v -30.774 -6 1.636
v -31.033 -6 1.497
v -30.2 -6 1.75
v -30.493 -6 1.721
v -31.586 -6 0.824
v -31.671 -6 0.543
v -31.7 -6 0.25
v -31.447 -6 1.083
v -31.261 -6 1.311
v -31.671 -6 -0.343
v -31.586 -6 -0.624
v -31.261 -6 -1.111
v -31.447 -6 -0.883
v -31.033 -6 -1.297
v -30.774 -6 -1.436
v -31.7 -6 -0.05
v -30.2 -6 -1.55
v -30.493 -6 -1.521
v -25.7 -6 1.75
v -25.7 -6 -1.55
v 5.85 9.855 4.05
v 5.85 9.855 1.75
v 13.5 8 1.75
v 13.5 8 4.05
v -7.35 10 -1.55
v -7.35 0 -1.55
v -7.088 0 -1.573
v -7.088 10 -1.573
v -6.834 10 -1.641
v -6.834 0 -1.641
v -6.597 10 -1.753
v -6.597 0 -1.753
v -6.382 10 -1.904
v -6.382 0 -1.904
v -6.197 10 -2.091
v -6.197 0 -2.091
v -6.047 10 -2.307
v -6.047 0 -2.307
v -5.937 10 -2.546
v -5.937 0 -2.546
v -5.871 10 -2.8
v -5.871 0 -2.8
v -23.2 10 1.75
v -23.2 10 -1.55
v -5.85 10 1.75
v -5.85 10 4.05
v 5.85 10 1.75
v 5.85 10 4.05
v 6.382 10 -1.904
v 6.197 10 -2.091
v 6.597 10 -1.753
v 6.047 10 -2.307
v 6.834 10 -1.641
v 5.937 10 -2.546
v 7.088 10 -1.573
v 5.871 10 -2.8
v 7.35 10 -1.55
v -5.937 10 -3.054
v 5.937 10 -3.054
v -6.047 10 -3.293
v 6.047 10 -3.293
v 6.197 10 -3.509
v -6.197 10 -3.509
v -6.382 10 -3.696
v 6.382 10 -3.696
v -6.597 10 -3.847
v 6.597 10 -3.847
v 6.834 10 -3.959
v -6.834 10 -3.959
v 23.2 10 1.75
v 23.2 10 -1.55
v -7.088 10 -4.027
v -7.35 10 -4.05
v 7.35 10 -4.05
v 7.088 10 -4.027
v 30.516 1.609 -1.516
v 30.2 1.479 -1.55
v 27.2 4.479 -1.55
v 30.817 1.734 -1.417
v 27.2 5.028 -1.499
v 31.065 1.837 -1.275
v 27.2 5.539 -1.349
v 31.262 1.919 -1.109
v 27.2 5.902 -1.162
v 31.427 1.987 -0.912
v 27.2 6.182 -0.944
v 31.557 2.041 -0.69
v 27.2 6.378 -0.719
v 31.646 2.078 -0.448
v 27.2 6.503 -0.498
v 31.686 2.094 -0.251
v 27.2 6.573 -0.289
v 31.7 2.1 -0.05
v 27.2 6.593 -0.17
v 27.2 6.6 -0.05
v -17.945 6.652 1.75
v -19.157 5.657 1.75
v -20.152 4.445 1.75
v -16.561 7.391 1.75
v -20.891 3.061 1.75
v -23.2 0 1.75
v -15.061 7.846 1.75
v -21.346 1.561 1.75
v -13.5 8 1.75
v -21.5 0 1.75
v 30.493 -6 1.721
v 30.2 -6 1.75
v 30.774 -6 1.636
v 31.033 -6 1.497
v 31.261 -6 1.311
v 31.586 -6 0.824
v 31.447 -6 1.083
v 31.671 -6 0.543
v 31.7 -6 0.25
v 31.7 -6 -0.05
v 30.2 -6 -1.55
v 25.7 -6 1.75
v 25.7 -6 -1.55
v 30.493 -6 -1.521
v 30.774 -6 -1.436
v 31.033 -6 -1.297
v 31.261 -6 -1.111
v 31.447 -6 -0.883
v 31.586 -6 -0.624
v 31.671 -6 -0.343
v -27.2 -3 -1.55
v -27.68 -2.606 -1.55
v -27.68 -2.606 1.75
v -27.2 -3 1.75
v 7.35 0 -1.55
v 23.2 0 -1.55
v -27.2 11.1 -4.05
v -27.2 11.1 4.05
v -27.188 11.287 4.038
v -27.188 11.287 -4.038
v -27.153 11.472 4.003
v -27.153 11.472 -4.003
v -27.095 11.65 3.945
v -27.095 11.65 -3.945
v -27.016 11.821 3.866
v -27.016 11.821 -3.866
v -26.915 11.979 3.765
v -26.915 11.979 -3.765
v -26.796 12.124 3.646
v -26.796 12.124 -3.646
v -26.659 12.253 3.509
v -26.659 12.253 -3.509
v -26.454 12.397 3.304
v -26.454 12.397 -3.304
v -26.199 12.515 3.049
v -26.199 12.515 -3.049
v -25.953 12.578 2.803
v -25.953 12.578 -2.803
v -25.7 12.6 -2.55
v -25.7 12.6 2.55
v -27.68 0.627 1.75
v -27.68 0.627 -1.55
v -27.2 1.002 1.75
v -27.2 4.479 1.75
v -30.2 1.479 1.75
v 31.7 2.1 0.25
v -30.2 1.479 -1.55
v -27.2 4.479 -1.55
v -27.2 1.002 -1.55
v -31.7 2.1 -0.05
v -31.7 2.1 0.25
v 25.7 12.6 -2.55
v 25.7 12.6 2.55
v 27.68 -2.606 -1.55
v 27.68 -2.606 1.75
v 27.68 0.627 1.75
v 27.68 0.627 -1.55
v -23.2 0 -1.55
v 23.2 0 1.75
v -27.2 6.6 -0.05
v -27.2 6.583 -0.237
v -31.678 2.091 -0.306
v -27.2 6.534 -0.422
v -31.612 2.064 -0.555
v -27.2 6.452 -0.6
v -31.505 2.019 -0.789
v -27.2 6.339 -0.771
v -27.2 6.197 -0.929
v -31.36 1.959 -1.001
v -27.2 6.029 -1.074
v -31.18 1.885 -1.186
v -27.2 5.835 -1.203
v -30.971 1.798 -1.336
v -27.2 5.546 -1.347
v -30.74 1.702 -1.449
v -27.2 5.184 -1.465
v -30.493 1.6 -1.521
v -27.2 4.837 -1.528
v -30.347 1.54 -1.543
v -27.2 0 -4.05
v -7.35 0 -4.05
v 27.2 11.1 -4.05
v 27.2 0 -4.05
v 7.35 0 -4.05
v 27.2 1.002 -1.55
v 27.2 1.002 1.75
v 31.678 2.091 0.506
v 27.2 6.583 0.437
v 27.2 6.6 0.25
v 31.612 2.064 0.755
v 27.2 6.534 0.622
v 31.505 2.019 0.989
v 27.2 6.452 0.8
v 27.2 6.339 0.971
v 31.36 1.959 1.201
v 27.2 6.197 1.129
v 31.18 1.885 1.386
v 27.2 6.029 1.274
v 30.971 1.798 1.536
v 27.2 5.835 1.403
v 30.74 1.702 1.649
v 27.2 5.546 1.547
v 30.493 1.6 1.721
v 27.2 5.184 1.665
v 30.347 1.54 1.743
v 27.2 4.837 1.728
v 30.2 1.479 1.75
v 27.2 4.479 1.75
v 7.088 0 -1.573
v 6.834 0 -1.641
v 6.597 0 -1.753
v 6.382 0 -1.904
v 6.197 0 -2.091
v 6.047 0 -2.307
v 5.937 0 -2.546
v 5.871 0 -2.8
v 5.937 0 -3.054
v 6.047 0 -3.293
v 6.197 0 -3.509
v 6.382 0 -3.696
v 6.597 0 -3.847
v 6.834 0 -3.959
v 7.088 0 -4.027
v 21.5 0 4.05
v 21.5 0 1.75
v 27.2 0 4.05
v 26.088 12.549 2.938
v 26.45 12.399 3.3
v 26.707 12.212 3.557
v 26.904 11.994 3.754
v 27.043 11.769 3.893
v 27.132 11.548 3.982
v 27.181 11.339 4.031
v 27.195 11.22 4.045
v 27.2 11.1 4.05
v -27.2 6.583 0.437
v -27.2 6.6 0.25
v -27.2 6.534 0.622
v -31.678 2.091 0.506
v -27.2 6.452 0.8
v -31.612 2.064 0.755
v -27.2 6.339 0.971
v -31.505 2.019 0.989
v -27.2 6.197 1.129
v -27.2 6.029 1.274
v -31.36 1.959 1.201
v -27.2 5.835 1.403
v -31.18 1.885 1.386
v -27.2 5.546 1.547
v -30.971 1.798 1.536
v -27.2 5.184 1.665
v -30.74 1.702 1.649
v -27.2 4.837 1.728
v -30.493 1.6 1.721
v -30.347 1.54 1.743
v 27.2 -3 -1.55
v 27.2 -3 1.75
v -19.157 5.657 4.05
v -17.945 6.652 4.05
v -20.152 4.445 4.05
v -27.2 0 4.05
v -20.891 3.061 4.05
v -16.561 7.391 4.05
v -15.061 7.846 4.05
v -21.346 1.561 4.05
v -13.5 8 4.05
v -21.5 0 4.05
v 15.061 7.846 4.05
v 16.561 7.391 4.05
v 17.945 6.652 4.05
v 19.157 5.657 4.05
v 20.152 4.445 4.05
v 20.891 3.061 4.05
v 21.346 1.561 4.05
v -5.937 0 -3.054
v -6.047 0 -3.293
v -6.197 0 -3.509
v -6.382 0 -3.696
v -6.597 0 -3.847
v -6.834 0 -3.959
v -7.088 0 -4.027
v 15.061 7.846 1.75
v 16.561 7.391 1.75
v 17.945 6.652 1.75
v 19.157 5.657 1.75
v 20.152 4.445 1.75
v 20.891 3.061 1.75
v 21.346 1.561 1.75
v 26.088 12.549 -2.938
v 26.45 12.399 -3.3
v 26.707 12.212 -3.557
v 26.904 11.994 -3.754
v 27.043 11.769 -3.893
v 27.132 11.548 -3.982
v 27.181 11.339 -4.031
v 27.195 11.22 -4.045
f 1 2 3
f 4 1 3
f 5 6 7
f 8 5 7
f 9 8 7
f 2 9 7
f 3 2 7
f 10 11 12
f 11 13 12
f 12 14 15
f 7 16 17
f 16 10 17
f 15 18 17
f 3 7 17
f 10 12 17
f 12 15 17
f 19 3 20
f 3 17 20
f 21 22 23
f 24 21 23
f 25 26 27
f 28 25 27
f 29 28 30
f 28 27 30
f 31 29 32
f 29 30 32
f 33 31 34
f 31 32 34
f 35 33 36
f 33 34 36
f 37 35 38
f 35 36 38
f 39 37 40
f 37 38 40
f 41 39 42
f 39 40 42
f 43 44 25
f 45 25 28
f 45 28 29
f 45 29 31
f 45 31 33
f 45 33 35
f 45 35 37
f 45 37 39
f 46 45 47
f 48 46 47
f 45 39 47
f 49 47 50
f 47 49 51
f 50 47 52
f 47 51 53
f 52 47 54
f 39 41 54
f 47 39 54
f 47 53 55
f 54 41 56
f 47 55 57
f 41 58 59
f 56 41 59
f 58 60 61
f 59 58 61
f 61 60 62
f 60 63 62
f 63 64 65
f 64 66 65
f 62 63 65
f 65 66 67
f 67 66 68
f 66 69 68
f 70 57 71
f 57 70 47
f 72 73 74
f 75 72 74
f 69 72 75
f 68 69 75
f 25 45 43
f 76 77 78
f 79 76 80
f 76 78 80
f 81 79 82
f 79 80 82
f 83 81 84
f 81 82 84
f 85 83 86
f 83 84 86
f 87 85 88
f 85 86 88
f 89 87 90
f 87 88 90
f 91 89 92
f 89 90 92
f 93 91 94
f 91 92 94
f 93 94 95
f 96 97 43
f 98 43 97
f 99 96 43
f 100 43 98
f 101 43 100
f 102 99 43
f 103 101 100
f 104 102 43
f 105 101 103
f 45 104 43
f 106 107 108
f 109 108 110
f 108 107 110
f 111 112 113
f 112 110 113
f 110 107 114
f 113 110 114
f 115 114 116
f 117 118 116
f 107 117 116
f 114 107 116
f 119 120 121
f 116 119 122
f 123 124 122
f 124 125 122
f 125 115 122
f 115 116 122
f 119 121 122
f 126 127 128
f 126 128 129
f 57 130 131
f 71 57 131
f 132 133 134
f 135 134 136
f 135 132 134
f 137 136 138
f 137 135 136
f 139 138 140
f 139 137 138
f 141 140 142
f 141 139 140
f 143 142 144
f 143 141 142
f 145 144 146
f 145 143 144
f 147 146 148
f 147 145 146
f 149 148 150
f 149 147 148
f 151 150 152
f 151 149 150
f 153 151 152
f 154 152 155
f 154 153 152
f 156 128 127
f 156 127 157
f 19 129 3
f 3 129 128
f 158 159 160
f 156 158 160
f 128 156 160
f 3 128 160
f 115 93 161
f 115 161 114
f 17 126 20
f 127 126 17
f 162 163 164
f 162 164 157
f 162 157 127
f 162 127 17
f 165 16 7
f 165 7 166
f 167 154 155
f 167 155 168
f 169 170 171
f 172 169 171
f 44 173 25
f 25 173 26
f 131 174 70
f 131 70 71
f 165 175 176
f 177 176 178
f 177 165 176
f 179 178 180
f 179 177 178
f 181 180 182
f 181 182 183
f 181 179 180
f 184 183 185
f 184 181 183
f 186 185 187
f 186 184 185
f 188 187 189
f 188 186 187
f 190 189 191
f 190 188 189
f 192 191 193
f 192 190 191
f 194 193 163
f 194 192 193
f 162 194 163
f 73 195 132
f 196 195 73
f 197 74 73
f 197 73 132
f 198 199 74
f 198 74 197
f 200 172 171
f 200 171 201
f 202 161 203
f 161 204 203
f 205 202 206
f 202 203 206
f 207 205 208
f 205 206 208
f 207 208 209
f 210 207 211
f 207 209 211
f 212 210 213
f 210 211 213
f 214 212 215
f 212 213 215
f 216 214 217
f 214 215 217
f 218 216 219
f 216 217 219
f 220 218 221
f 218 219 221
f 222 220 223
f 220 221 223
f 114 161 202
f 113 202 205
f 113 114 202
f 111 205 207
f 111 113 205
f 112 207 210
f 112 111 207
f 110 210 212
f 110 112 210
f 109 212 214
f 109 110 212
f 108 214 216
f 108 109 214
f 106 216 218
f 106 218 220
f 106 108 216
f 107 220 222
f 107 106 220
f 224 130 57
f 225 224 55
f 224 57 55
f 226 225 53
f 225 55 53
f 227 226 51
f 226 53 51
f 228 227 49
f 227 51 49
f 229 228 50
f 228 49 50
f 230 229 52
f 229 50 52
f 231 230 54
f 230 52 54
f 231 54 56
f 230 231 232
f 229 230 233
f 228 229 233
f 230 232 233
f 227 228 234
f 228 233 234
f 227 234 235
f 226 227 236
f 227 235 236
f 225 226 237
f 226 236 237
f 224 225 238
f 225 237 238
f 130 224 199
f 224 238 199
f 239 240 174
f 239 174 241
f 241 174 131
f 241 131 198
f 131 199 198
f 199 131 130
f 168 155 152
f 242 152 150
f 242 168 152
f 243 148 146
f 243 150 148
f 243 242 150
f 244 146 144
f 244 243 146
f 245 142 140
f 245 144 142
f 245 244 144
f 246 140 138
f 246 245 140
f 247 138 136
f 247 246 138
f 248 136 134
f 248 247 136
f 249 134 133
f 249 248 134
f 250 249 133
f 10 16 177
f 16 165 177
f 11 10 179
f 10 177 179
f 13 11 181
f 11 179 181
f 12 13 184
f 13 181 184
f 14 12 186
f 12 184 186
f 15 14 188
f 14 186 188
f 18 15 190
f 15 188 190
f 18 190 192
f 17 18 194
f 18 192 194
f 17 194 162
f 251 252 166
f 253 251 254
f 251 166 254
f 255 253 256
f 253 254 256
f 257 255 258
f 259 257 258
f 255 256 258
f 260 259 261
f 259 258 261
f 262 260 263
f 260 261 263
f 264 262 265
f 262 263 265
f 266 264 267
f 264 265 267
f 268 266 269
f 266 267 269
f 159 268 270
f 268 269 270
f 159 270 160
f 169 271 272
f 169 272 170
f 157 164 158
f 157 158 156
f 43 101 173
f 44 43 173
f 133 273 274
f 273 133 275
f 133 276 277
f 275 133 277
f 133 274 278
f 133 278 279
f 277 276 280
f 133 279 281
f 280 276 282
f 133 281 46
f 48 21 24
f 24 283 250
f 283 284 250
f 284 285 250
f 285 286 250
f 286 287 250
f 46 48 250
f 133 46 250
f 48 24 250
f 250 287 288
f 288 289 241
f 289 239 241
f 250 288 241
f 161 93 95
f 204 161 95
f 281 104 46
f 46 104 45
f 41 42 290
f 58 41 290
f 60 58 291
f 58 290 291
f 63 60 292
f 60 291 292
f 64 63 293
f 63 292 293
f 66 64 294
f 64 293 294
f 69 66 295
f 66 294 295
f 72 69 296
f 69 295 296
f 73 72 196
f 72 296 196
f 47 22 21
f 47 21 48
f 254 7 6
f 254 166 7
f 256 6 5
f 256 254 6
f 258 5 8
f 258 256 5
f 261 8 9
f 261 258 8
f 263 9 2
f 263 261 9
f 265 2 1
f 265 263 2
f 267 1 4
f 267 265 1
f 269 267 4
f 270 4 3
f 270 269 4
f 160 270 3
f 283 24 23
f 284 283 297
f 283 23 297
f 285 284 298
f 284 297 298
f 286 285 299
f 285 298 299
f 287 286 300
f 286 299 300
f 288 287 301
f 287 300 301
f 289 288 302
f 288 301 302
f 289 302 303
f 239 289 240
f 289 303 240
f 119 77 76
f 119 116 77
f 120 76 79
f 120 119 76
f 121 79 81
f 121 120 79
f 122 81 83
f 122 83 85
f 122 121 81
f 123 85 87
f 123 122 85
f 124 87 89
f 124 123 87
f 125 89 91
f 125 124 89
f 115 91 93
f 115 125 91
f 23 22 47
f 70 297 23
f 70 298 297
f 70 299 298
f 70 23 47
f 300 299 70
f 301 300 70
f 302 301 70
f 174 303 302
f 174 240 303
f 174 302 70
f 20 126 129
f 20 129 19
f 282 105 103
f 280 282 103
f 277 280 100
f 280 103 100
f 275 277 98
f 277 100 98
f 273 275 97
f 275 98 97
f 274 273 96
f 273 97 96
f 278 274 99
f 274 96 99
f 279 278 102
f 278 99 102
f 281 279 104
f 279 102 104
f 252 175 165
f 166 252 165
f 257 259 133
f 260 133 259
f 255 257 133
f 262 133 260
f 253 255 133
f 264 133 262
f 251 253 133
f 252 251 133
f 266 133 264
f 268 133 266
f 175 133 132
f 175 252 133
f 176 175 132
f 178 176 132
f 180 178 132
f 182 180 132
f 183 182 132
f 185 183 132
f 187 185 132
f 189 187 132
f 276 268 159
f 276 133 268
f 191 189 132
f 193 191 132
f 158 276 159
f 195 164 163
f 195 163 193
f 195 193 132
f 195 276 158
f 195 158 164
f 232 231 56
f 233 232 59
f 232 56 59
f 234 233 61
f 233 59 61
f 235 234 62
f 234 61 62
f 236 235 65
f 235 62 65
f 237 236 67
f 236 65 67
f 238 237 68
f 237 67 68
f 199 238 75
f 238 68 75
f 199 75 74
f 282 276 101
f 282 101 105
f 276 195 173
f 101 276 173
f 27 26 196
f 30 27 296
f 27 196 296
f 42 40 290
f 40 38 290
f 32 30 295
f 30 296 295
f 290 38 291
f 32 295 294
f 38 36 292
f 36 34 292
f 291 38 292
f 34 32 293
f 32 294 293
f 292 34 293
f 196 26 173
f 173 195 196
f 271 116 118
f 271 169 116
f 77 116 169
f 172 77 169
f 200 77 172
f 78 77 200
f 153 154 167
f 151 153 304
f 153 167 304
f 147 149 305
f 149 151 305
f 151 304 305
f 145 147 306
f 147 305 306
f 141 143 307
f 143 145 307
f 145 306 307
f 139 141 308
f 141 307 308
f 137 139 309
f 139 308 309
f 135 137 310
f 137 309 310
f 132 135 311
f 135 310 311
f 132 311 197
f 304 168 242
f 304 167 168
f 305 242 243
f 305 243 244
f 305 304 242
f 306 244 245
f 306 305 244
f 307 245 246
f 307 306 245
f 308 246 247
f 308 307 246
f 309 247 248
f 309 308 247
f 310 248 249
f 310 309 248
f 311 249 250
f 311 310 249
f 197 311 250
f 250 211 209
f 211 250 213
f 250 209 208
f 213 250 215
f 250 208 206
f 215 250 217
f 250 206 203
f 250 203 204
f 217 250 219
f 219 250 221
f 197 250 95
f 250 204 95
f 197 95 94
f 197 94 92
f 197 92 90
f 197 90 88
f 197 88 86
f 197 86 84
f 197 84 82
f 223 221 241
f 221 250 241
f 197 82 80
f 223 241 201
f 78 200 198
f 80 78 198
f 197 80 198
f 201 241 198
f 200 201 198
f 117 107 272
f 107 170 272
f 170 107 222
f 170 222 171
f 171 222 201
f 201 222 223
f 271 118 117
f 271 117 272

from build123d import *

# Parameters (mm, degrees)
SKETCH1_W           = 54.4
SKETCH1_H           = 8.1
SKETCH1_W_2         = 46.4
SKETCH1_H_2         = 3.3
BOSS_EXTRUDE1_DEPTH = 10
SKETCH2_W           = 11.7
SKETCH2_H           = 20
CUT_EXTRUDE1_DEPTH  = 10
SKETCH3_R           = 8
CUT_EXTRUDE2_DEPTH  = 10
SKETCH4_W           = 54.4
SKETCH4_H           = 8.1
BOSS_EXTRUDE2_DEPTH = 2.6
BOSS_EXTRUDE3_DEPTH = 3.3
SKETCH2_2_W         = 11.7
SKETCH2_2_H         = 20
CUT_EXTRUDE3_DEPTH  = 20
CUT_EXTRUDE4_START  = -5
CUT_EXTRUDE4_DEPTH  = 5
SKETCH7_W           = 2.777966001
SKETCH7_H           = 4.960653573
BOSS_EXTRUDE4_DEPTH = 3.3
FILLET1_R           = 1.5
FILLET2_R           = 1.5
FILLET3_R           = 1.5
FILLET4_R           = 1.5


with BuildPart() as part:
    # Sketch1 → Boss-Extrude1 (new body)
    with BuildSketch(Plane(origin=(0, 0, 0), x_dir=(1, 0, 0), z_dir=(0, 1, 0))):
        Rectangle(SKETCH1_W, SKETCH1_H)
        with Locations((0, -0.1)):
            Rectangle(SKETCH1_W_2, SKETCH1_H_2, mode=Mode.SUBTRACT)
    extrude(amount=BOSS_EXTRUDE1_DEPTH)

    # Sketch2 → Cut-Extrude1 (cut)
    with BuildSketch(Plane.XY.offset(-1.55)):
        Rectangle(SKETCH2_W, SKETCH2_H)
    extrude(amount=-CUT_EXTRUDE1_DEPTH, mode=Mode.SUBTRACT)

    # Sketch3 → Cut-Extrude2 (cut)
    with BuildSketch(Plane(origin=(0, 0, 1.75), x_dir=(-1, 0, 0), z_dir=(0, 0, -1))):
        with Locations((-13.5, 0)):
            Circle(SKETCH3_R)
        with Locations((13.5, 0)):
            Circle(SKETCH3_R)
    extrude(amount=-CUT_EXTRUDE2_DEPTH, mode=Mode.SUBTRACT)

    # Sketch4 → Boss-Extrude2 (add)
    with BuildSketch(Plane(origin=(0, 10, 0), x_dir=(1, 0, 0), z_dir=(0, 1, 0))):
        Rectangle(SKETCH4_W, SKETCH4_H)
    extrude(amount=BOSS_EXTRUDE2_DEPTH)

    # Sketch5 → Boss-Extrude3 (add)
    with BuildSketch(Plane.XY.offset(-1.55)):
        Polygon((27.2, -6), (25.7, -6), (27.2, -3), (29.7, -0.95), (27.2, 1.001976063), (27.2, 6.6), (29.7, 4.1), (31.7, 2.1), (31.7, -6), (29.7, -6), align=None)
        Polygon((-27.2, 6.6), (-27.2, 1.001976063), (-29.7, -0.95), (-27.2, -3), (-25.7, -6), (-27.2, -6), (-29.7, -6), (-31.7, -6), (-31.7, 2.1), (-29.7, 4.1), align=None)
    extrude(amount=BOSS_EXTRUDE3_DEPTH)

    # Sketch2<2> → Cut-Extrude3 (cut)
    with BuildSketch(Plane.XY.offset(-1.55)):
        Rectangle(SKETCH2_2_W, SKETCH2_2_H)
    extrude(amount=CUT_EXTRUDE3_DEPTH, mode=Mode.SUBTRACT)

    # Sketch6 → Cut-Extrude4 (cut)
    with BuildSketch(Plane.XY.offset(4.05).offset(CUT_EXTRUDE4_START)):
        with BuildLine():
            Line((-13.5, 8), (-5.85, 10))
            Line((-5.85, 10), (5.25, 10))
            Line((5.25, 10), (13.5, 8))
            ThreePointArc((13.5, 8), (21.5, 0), (13.5, -8))
            Line((13.5, -8), (-13.5, -8))
            ThreePointArc((-13.5, -8), (-21.5, 0), (-13.5, 8))
        make_face()
    extrude(amount=CUT_EXTRUDE4_DEPTH, mode=Mode.SUBTRACT)

    # Sketch7 → Boss-Extrude4 (add)
    with BuildSketch(Plane.XY.offset(1.75)):
        with Locations((-29.069429935, -1.511833966)):
            Rectangle(SKETCH7_W, SKETCH7_H)
        with Locations((29.069429935, -1.511833966)):
            Rectangle(SKETCH7_W, SKETCH7_H)
    extrude(amount=-BOSS_EXTRUDE4_DEPTH)

    # Fillet1
    fillet1_edges = [part.edges().sort_by_distance(p)[0] for p in [
        (-27.2, 12.6, 0),
        (0, 12.6, 4.05),
        (27.2, 12.6, 0),
        (0, 12.6, -4.05),
    ]]
    fillet(fillet1_edges, radius=FILLET1_R)

    # Fillet2
    # the kernel refuses this fillet: 1.5 mm, written as the material it takes off along each edge
    with BuildSketch(Plane(origin=(5.85, 10, -1.55), x_dir=(1, 0, 0), z_dir=(0, -1, 0))) as fillet2_piece_1:
        with BuildLine():
            CenterArc((FILLET2_R, -FILLET2_R), FILLET2_R, 90, 90)
            Line((0, -FILLET2_R), (0, 0))
            Line((0, 0), (FILLET2_R, 0))
        make_face()
    extrude(amount=13.75, mode=Mode.SUBTRACT)
    with BuildSketch(Plane(origin=(5.85, 10, -4.05), x_dir=(1, 0, 0), z_dir=(0, -1, 0))) as fillet2_piece_2:
        with BuildLine():
            CenterArc((FILLET2_R, FILLET2_R), FILLET2_R, 180, 90)
            Line((0, FILLET2_R), (0, 0))
            Line((0, 0), (FILLET2_R, 0))
        make_face()
    extrude(amount=13.75, mode=Mode.SUBTRACT)

    # Fillet3
    # the kernel refuses this fillet: 1.5 mm, written as the material it takes off along each edge
    with BuildSketch(Plane(origin=(-5.85, -3.75, -1.55), x_dir=(0, 0, -1), z_dir=(0, 1, 0)), Plane(origin=(-5.85, -3.75, -4.05), x_dir=(-1, 0, 0), z_dir=(0, 1, 0))) as fillet3_piece_1:
        with BuildLine():
            CenterArc((FILLET3_R, FILLET3_R), FILLET3_R, 180, 90)
            Line((0, FILLET3_R), (0, 0))
            Line((0, 0), (FILLET3_R, 0))
        make_face()
    extrude(amount=13.75, mode=Mode.SUBTRACT)

    # Fillet4
    fillet4_edges = [part.edges().sort_by_distance(p)[0] for p in [
        (31.7, -1.95, -1.55),
        (29.45, 4.35, -1.55),
        (31.7, -1.95, 1.75),
        (29.45, 4.35, 1.75),
        (-29.45, 4.35, -1.55),
        (-31.7, -1.95, -1.55),
        (-29.45, 4.35, 1.75),
        (-31.7, -1.95, 1.75),
    ]]
    fillet(fillet4_edges, radius=FILLET4_R)


solid = part.part
